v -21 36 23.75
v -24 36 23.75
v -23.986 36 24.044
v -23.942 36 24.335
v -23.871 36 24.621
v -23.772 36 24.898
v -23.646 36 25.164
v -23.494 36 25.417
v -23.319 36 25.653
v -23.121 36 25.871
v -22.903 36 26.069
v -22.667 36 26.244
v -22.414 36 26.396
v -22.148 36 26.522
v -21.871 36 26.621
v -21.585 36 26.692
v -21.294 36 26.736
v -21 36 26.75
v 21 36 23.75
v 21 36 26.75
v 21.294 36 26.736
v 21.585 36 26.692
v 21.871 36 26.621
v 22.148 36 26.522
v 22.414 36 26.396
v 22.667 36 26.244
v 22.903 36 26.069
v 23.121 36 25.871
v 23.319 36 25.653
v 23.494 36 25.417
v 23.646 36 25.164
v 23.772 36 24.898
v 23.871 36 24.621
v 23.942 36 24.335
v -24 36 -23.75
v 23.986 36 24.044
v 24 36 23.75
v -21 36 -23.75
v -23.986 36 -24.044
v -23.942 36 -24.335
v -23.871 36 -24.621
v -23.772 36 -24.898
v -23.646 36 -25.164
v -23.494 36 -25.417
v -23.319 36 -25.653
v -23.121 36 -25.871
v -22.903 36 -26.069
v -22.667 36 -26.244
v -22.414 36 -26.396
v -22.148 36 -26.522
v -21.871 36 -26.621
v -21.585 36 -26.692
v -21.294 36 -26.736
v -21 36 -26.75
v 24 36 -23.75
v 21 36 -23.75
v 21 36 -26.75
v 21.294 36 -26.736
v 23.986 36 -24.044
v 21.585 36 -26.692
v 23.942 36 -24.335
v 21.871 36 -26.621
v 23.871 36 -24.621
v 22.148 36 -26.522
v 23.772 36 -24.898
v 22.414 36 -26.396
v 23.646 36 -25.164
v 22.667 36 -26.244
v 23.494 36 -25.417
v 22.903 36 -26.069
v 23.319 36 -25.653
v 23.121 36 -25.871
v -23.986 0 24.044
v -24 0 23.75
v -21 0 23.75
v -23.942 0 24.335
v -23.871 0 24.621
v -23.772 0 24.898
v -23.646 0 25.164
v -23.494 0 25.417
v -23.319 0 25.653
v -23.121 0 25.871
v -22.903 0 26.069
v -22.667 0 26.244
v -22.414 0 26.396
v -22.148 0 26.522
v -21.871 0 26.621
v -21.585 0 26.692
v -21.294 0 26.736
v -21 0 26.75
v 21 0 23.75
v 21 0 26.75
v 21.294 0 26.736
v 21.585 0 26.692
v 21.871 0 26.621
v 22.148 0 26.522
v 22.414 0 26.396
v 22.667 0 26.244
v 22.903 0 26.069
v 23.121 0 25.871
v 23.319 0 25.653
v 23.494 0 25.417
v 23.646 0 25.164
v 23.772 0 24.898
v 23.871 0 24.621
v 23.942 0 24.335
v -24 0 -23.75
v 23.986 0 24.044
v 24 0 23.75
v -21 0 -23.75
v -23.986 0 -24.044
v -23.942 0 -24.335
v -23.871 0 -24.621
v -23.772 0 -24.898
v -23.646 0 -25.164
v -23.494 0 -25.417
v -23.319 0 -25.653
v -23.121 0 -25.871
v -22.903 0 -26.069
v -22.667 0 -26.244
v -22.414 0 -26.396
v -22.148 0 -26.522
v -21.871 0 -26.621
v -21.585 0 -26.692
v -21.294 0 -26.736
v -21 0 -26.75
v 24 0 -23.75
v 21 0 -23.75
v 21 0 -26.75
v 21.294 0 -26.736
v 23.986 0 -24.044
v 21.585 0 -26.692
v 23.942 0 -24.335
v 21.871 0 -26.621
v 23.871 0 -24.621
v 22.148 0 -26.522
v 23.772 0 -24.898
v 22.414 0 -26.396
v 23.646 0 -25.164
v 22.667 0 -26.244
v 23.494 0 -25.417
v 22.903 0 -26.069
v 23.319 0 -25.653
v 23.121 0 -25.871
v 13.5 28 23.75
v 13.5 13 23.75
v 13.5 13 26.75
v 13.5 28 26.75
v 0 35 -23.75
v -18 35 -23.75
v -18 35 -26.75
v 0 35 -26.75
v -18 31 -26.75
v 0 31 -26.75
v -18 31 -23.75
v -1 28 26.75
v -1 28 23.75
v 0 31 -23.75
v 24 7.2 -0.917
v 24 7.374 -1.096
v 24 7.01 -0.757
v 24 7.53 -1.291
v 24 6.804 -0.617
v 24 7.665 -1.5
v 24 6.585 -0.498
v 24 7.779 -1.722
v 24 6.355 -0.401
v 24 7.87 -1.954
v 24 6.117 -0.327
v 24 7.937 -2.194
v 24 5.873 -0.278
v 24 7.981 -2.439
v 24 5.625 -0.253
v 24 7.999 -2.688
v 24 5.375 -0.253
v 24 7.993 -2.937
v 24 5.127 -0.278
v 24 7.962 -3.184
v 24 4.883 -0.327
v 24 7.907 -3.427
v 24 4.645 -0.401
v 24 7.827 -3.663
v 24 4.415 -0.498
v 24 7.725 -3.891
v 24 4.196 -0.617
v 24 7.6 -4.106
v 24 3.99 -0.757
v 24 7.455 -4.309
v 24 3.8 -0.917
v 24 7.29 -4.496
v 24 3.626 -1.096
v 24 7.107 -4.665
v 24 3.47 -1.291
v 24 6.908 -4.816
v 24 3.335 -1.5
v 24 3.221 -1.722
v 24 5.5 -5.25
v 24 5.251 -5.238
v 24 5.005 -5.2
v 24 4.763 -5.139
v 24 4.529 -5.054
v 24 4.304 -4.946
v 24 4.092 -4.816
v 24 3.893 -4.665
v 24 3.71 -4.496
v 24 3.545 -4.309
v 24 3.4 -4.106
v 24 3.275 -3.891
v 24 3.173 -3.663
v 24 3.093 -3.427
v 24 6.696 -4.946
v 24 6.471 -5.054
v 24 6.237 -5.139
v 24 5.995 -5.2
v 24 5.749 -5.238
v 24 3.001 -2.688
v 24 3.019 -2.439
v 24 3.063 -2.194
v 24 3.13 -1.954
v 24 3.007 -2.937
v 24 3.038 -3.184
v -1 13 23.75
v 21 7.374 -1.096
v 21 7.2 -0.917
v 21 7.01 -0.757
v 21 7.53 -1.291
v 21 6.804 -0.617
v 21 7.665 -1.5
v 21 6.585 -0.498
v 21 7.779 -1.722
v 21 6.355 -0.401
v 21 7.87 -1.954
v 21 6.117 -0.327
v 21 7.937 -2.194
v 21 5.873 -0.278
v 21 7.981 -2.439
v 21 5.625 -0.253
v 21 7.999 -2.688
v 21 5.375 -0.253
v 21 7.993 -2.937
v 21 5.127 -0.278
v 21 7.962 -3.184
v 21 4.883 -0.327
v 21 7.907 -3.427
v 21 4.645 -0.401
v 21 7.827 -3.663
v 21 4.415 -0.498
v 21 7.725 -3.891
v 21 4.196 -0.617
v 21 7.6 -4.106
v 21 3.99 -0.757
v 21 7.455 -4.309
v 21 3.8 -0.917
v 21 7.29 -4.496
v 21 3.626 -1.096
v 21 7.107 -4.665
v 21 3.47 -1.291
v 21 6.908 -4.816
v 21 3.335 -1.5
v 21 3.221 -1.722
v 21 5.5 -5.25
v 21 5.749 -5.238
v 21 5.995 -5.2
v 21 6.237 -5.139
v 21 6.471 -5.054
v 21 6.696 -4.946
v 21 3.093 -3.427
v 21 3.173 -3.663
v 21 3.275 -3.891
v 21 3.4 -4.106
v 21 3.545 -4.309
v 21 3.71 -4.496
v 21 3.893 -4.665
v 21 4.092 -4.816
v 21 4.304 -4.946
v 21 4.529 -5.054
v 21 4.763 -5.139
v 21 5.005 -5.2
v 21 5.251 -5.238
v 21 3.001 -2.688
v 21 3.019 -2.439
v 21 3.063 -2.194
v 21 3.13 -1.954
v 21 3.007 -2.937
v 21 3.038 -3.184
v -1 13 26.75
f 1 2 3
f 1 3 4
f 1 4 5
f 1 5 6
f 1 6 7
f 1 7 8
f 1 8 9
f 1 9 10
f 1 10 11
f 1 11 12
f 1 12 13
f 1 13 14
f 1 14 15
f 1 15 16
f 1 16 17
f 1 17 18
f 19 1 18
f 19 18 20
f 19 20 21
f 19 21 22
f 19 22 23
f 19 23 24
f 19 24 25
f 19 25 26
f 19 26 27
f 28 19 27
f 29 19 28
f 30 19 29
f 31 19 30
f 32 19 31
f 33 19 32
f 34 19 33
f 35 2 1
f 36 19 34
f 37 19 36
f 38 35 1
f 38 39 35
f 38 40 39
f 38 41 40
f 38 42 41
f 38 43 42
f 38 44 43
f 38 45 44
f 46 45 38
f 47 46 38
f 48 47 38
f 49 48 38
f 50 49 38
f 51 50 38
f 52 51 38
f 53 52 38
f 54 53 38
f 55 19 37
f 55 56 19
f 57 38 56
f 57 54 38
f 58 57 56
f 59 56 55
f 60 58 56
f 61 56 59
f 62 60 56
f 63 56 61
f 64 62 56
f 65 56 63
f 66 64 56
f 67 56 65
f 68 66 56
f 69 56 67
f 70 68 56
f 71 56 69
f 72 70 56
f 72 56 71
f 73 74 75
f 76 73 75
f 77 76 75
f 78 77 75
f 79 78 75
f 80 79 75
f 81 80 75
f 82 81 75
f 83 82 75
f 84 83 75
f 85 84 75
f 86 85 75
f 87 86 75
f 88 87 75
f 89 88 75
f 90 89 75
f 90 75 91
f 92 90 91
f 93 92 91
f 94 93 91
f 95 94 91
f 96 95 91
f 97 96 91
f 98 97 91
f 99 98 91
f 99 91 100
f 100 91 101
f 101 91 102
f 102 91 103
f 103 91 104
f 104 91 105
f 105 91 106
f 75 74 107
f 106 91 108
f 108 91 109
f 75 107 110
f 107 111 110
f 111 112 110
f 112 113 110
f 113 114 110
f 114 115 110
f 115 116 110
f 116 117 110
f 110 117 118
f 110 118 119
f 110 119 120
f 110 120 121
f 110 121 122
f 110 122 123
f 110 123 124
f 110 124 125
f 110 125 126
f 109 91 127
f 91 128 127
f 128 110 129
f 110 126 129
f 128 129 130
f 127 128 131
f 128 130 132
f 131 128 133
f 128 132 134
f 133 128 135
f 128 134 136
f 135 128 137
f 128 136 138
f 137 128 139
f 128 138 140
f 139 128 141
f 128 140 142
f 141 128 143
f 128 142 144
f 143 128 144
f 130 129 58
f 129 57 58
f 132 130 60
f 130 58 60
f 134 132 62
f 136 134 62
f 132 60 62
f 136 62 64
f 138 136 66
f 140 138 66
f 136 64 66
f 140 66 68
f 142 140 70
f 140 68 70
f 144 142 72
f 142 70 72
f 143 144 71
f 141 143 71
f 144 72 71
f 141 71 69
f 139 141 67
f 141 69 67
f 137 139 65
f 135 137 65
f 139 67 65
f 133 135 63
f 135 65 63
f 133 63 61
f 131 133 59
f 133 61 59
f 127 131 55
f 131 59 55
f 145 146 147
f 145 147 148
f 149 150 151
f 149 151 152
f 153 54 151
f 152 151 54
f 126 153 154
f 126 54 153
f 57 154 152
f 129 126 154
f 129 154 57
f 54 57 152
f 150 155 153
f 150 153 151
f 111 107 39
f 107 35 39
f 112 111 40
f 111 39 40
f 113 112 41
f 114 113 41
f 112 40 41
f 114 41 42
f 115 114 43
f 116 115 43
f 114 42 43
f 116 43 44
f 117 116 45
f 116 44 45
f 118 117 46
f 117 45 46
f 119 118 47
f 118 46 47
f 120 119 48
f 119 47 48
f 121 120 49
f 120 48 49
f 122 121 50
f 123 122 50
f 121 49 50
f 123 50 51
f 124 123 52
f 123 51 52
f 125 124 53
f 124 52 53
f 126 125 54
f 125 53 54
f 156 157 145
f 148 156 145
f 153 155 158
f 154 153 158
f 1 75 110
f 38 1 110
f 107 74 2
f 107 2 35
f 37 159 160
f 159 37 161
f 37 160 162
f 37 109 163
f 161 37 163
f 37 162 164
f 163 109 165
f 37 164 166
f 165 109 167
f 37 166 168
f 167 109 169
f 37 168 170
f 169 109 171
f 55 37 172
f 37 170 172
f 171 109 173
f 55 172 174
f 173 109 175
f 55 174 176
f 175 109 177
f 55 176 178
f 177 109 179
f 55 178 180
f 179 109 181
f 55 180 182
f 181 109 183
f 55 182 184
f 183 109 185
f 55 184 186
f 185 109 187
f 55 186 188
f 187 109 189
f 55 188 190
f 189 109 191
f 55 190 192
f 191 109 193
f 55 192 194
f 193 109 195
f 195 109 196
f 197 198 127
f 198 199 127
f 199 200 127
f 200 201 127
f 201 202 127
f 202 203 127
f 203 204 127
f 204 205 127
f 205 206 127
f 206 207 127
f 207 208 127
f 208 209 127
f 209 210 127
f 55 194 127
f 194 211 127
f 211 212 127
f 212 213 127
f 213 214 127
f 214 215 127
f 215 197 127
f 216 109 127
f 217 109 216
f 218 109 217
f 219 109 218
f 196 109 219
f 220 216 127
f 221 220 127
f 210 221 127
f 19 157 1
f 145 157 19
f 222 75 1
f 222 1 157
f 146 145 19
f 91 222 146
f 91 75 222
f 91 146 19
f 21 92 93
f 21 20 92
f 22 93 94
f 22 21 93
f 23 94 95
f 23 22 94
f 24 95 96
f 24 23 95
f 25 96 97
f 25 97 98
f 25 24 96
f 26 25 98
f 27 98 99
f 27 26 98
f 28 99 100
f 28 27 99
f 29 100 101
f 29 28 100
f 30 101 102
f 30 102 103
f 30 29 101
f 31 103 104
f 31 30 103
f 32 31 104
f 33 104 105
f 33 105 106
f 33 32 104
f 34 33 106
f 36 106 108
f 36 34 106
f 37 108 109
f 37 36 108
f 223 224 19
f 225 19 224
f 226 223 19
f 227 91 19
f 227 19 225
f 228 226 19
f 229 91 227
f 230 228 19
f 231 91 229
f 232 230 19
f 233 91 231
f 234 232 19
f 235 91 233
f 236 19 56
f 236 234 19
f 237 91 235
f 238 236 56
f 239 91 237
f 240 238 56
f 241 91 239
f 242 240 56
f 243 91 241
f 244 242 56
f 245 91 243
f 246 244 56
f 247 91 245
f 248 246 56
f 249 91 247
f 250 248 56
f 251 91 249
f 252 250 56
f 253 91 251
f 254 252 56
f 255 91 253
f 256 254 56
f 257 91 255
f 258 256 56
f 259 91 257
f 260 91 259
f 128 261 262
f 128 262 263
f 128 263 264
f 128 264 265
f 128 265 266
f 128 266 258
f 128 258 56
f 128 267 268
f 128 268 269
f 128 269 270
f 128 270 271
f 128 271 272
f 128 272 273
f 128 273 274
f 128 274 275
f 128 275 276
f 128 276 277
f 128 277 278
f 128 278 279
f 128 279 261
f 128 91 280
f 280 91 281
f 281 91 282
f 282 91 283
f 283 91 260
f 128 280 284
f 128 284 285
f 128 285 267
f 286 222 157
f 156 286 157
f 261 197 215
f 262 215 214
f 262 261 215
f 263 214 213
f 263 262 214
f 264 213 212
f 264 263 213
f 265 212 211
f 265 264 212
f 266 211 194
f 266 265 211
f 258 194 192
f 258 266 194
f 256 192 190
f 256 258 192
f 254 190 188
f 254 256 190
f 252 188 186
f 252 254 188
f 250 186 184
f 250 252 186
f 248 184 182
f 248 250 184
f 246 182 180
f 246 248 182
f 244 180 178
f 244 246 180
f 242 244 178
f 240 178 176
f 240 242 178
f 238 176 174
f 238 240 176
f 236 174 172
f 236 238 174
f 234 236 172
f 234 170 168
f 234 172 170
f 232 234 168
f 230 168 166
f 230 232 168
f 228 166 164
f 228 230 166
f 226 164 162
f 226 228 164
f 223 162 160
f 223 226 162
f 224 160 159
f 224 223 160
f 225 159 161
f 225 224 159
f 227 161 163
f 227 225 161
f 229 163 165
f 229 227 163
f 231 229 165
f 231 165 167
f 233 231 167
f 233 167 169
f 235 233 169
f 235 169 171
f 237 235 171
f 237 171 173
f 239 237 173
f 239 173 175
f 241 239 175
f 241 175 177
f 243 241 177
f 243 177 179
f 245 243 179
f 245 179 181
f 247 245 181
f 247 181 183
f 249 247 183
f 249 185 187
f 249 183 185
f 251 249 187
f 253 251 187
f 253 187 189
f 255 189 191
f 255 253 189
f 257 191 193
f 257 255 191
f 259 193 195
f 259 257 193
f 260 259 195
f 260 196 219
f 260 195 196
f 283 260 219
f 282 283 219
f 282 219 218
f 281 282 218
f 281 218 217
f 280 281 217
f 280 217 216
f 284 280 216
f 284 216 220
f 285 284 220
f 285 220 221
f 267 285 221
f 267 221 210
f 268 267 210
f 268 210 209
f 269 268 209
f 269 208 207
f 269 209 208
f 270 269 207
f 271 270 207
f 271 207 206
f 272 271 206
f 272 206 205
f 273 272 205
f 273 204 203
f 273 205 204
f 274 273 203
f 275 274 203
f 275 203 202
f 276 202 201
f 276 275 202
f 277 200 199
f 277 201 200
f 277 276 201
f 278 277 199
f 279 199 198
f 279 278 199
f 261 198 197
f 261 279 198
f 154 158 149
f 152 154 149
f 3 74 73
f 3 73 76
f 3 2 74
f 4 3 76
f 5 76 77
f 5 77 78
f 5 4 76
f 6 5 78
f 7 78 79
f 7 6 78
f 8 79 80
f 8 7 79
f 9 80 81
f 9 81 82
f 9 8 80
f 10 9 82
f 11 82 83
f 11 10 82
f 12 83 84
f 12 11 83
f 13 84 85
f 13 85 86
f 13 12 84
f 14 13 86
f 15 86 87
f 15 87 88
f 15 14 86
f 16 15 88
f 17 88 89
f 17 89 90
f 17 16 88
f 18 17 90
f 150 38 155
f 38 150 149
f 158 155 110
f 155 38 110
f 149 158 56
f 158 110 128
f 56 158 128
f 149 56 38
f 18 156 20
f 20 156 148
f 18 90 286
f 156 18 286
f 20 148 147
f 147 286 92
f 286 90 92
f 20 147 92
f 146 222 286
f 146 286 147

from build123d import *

# Parameters (mm, degrees)
SKETCH1_W           = 48
SKETCH1_H           = 53.5
SKETCH1_W_2         = 42
SKETCH1_H_2         = 47.5
BOSS_EXTRUDE1_DEPTH = 36
SKETCH2_R           = 2.5
CUT_EXTRUDE1_DEPTH  = 9
SKETCH4_W           = 14.5
SKETCH4_H           = 15
CUT_EXTRUDE2_DEPTH  = 15
SKETCH6_W           = 18
SKETCH6_H           = 4
CUT_EXTRUDE3_DEPTH  = 15
FILLET1_R           = 3


with BuildPart() as part:
    # Sketch1 → Boss-Extrude1 (new body)
    with BuildSketch(Plane(origin=(0, 0, 0), x_dir=(1, 0, 0), z_dir=(0, 1, 0))):
        Rectangle(SKETCH1_W, SKETCH1_H)
        Rectangle(SKETCH1_W_2, SKETCH1_H_2, mode=Mode.SUBTRACT)
    extrude(amount=BOSS_EXTRUDE1_DEPTH)

    # Sketch2 → Cut-Extrude1 (cut)
    with BuildSketch(Plane(origin=(21, 0, 0), x_dir=(0, 0, -1), z_dir=(1, 0, 0))):
        with Locations((2.75, 5.5)):
            Circle(SKETCH2_R)
    extrude(amount=CUT_EXTRUDE1_DEPTH, mode=Mode.SUBTRACT)

    # Sketch4 → Cut-Extrude2 (cut)
    with BuildSketch(Plane.XY.offset(23.75)):
        with Locations((6.25, 20.5)):
            Rectangle(SKETCH4_W, SKETCH4_H)
    extrude(amount=CUT_EXTRUDE2_DEPTH, mode=Mode.SUBTRACT)

    # Sketch6 → Cut-Extrude3 (cut)
    with BuildSketch(Plane.XY.offset(-23.75)):
        with Locations((-9, 33)):
            Rectangle(SKETCH6_W, SKETCH6_H)
    extrude(amount=-CUT_EXTRUDE3_DEPTH, mode=Mode.SUBTRACT)

    # Fillet1
    fillet1_edges = [part.edges().sort_by_distance(p)[0] for p in [
        (24, 18, 26.75),
        (-24, 18, 26.75),
        (-24, 18, -26.75),
        (24, 18, -26.75),
    ]]
    fillet(fillet1_edges, radius=FILLET1_R)


solid = part.part
